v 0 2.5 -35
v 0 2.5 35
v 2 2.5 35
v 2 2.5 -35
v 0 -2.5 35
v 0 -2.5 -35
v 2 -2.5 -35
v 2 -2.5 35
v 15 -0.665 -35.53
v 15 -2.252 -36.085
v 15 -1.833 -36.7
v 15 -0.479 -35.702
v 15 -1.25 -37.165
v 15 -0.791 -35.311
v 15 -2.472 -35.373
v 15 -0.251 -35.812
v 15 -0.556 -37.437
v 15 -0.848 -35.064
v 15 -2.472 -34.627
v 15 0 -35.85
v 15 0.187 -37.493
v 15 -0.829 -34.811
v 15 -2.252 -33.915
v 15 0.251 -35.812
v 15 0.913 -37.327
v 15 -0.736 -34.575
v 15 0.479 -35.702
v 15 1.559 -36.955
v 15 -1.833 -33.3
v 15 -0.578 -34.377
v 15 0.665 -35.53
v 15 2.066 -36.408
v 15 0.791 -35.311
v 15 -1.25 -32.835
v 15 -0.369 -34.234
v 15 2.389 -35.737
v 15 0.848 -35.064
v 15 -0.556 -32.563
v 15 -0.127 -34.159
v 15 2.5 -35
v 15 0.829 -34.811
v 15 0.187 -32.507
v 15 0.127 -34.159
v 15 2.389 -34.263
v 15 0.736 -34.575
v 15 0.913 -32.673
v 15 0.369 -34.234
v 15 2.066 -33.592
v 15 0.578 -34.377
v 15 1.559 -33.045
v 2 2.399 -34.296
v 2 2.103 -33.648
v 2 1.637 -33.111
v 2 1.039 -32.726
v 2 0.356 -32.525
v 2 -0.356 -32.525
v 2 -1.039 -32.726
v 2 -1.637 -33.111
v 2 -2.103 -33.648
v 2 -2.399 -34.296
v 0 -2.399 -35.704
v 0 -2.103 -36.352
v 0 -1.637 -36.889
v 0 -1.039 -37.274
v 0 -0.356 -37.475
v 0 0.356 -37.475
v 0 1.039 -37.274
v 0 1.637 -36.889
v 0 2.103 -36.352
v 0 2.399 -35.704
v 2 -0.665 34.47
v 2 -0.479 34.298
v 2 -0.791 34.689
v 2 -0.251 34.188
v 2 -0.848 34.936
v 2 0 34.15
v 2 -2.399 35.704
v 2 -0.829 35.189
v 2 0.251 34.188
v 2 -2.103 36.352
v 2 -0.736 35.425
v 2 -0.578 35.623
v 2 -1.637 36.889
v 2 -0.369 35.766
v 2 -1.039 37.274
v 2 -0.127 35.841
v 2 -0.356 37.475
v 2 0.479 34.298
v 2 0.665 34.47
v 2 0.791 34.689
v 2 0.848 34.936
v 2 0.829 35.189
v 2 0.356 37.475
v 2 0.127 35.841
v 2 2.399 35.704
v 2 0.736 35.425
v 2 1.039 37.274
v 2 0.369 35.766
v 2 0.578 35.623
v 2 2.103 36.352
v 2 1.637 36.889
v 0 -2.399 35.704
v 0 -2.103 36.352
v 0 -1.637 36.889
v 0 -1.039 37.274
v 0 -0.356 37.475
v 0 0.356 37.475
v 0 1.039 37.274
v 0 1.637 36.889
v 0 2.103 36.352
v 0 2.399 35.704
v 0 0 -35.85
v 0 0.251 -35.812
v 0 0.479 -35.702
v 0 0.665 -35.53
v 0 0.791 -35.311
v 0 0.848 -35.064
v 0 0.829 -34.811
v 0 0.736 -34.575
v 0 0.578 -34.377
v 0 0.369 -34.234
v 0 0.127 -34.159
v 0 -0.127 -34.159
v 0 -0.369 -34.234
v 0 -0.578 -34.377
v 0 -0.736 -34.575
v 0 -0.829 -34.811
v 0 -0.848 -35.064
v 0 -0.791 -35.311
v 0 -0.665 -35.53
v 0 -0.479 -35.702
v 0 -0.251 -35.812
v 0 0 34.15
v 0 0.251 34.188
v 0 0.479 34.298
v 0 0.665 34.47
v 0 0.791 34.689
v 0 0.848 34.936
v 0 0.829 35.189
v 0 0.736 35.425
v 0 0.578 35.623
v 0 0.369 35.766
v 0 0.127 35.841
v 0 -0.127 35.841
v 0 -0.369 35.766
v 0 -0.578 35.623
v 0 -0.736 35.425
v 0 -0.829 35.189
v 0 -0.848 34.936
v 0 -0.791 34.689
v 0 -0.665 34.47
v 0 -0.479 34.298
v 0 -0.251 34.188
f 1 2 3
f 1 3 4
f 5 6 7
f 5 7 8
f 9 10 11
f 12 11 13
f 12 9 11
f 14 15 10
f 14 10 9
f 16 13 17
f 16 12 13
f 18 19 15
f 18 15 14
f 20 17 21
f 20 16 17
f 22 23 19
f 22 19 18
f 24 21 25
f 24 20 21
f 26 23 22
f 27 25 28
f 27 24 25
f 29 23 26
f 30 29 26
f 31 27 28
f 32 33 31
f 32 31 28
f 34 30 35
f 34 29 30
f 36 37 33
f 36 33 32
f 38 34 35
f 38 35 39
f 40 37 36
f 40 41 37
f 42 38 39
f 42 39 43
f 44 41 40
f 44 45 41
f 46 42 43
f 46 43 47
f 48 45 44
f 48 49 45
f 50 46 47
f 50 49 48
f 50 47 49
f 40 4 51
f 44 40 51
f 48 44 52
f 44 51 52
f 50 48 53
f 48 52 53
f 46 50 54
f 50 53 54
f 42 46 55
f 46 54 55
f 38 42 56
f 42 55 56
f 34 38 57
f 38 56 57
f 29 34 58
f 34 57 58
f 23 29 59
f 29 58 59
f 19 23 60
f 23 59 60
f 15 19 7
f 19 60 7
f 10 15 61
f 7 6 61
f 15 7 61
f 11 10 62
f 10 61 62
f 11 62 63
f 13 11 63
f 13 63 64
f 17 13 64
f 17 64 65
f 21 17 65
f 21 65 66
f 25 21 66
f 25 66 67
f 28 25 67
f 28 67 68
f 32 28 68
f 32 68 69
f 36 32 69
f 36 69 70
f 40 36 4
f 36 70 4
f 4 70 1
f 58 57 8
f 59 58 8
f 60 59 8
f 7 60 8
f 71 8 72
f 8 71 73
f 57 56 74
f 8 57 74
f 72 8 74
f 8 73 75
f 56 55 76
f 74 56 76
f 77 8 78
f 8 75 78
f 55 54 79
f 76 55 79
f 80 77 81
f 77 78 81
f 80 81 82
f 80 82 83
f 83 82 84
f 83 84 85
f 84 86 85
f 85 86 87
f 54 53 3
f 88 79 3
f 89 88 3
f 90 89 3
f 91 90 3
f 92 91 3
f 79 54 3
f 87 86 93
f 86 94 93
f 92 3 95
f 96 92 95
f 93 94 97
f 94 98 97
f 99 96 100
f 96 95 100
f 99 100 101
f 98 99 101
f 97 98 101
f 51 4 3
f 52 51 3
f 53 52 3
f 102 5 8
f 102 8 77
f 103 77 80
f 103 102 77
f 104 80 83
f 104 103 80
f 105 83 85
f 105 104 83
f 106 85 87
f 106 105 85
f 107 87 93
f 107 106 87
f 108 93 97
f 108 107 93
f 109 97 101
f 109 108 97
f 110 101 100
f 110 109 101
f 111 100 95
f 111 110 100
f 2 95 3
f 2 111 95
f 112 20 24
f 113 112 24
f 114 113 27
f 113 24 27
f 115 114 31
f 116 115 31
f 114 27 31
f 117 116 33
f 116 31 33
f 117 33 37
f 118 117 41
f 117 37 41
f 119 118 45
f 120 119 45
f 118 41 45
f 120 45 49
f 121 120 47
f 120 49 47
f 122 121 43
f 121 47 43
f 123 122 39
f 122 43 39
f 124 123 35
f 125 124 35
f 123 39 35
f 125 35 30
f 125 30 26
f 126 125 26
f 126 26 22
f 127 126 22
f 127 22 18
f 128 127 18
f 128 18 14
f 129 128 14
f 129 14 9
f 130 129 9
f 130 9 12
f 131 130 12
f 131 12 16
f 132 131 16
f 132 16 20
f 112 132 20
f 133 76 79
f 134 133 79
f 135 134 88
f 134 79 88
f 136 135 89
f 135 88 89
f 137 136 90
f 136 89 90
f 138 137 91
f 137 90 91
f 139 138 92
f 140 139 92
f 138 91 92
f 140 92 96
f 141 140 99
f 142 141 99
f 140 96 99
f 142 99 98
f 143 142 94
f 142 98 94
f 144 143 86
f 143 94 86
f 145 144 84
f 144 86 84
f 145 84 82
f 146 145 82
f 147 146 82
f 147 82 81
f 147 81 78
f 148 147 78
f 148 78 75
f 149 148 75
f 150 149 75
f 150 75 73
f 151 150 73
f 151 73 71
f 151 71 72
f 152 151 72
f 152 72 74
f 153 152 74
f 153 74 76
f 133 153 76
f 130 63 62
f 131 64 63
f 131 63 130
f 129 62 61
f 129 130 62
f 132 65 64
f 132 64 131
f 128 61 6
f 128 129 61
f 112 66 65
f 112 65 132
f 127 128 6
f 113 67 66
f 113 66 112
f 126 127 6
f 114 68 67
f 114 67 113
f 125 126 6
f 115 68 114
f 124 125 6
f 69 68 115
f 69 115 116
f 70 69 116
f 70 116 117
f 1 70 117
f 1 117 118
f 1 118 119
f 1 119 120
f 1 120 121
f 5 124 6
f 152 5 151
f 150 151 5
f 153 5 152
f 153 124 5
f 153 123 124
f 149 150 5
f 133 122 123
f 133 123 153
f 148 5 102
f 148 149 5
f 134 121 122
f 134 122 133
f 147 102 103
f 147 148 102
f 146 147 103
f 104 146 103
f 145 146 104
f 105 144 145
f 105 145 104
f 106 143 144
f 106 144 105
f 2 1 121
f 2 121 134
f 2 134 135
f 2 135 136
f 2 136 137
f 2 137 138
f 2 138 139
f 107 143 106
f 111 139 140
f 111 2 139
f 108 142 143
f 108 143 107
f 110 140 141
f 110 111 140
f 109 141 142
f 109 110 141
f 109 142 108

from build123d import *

# Parameters (mm, degrees)
RESSALTO_EXTRUS_O1_DEPTH = 2
ESBO_O2_R                = 2.5
RESSALTO_EXTRUS_O2_DEPTH = 13
CORTE_EXTRUS_O1_REACH    = 42.466
ESBO_O3_R                = 0.85
CORTE_EXTRUS_O2_REACH    = 41.768
ESBO_O4_R                = 0.85


with BuildPart() as part:
    # Esboço1 → Ressalto-extrusão1 (new body)
    with BuildSketch(Plane(origin=(0, 0, 0), x_dir=(0, 0, -1), z_dir=(1, 0, 0))):
        with BuildLine():
            Line((-35, 2.5), (35, 2.5))
            ThreePointArc((35, 2.5), (37.5, 0), (35, -2.5))
            Line((35, -2.5), (-35, -2.5))
            ThreePointArc((-35, -2.5), (-37.5, 0), (-35, 2.5))
        make_face()
    extrude(amount=RESSALTO_EXTRUS_O1_DEPTH)

    # Esboço2 → Ressalto-extrusão2 (add)
    with BuildSketch(Plane(origin=(2, 0, 0), x_dir=(0, 0, -1), z_dir=(1, 0, 0))):
        with Locations(Location((35, 0, 0), (0, 0, 90))):
            Circle(ESBO_O2_R)
    extrude(amount=RESSALTO_EXTRUS_O2_DEPTH)

    # Esboço3 → Corte-extrusão1 (cut, up to next)
    with BuildSketch(Plane(origin=(15, 0, 0), x_dir=(0, 0, -1), z_dir=(1, 0, 0)), mode=Mode.PRIVATE) as corte_extrus_o1_sk1:
        with Locations((35, 0)):
            Circle(ESBO_O3_R)
    corte_extrus_o1_tool1 = extrude(corte_extrus_o1_sk1.sketch, amount=-CORTE_EXTRUS_O1_REACH, mode=Mode.PRIVATE) & part.part
    add(corte_extrus_o1_tool1.solids().sort_by_distance((15, 0, -35))[0], mode=Mode.SUBTRACT)

    # Esboço4 → Corte-extrusão2 (cut, up to next)
    with BuildSketch(Plane(origin=(2, 0, 0), x_dir=(0, 0, -1), z_dir=(1, 0, 0)), mode=Mode.PRIVATE) as corte_extrus_o2_sk1:
        with Locations((-35, 0)):
            Circle(ESBO_O4_R)
    corte_extrus_o2_tool1 = extrude(corte_extrus_o2_sk1.sketch, amount=-CORTE_EXTRUS_O2_REACH, mode=Mode.PRIVATE) & part.part
    add(corte_extrus_o2_tool1.solids().sort_by_distance((2, 0, 35))[0], mode=Mode.SUBTRACT)


solid = part.part
